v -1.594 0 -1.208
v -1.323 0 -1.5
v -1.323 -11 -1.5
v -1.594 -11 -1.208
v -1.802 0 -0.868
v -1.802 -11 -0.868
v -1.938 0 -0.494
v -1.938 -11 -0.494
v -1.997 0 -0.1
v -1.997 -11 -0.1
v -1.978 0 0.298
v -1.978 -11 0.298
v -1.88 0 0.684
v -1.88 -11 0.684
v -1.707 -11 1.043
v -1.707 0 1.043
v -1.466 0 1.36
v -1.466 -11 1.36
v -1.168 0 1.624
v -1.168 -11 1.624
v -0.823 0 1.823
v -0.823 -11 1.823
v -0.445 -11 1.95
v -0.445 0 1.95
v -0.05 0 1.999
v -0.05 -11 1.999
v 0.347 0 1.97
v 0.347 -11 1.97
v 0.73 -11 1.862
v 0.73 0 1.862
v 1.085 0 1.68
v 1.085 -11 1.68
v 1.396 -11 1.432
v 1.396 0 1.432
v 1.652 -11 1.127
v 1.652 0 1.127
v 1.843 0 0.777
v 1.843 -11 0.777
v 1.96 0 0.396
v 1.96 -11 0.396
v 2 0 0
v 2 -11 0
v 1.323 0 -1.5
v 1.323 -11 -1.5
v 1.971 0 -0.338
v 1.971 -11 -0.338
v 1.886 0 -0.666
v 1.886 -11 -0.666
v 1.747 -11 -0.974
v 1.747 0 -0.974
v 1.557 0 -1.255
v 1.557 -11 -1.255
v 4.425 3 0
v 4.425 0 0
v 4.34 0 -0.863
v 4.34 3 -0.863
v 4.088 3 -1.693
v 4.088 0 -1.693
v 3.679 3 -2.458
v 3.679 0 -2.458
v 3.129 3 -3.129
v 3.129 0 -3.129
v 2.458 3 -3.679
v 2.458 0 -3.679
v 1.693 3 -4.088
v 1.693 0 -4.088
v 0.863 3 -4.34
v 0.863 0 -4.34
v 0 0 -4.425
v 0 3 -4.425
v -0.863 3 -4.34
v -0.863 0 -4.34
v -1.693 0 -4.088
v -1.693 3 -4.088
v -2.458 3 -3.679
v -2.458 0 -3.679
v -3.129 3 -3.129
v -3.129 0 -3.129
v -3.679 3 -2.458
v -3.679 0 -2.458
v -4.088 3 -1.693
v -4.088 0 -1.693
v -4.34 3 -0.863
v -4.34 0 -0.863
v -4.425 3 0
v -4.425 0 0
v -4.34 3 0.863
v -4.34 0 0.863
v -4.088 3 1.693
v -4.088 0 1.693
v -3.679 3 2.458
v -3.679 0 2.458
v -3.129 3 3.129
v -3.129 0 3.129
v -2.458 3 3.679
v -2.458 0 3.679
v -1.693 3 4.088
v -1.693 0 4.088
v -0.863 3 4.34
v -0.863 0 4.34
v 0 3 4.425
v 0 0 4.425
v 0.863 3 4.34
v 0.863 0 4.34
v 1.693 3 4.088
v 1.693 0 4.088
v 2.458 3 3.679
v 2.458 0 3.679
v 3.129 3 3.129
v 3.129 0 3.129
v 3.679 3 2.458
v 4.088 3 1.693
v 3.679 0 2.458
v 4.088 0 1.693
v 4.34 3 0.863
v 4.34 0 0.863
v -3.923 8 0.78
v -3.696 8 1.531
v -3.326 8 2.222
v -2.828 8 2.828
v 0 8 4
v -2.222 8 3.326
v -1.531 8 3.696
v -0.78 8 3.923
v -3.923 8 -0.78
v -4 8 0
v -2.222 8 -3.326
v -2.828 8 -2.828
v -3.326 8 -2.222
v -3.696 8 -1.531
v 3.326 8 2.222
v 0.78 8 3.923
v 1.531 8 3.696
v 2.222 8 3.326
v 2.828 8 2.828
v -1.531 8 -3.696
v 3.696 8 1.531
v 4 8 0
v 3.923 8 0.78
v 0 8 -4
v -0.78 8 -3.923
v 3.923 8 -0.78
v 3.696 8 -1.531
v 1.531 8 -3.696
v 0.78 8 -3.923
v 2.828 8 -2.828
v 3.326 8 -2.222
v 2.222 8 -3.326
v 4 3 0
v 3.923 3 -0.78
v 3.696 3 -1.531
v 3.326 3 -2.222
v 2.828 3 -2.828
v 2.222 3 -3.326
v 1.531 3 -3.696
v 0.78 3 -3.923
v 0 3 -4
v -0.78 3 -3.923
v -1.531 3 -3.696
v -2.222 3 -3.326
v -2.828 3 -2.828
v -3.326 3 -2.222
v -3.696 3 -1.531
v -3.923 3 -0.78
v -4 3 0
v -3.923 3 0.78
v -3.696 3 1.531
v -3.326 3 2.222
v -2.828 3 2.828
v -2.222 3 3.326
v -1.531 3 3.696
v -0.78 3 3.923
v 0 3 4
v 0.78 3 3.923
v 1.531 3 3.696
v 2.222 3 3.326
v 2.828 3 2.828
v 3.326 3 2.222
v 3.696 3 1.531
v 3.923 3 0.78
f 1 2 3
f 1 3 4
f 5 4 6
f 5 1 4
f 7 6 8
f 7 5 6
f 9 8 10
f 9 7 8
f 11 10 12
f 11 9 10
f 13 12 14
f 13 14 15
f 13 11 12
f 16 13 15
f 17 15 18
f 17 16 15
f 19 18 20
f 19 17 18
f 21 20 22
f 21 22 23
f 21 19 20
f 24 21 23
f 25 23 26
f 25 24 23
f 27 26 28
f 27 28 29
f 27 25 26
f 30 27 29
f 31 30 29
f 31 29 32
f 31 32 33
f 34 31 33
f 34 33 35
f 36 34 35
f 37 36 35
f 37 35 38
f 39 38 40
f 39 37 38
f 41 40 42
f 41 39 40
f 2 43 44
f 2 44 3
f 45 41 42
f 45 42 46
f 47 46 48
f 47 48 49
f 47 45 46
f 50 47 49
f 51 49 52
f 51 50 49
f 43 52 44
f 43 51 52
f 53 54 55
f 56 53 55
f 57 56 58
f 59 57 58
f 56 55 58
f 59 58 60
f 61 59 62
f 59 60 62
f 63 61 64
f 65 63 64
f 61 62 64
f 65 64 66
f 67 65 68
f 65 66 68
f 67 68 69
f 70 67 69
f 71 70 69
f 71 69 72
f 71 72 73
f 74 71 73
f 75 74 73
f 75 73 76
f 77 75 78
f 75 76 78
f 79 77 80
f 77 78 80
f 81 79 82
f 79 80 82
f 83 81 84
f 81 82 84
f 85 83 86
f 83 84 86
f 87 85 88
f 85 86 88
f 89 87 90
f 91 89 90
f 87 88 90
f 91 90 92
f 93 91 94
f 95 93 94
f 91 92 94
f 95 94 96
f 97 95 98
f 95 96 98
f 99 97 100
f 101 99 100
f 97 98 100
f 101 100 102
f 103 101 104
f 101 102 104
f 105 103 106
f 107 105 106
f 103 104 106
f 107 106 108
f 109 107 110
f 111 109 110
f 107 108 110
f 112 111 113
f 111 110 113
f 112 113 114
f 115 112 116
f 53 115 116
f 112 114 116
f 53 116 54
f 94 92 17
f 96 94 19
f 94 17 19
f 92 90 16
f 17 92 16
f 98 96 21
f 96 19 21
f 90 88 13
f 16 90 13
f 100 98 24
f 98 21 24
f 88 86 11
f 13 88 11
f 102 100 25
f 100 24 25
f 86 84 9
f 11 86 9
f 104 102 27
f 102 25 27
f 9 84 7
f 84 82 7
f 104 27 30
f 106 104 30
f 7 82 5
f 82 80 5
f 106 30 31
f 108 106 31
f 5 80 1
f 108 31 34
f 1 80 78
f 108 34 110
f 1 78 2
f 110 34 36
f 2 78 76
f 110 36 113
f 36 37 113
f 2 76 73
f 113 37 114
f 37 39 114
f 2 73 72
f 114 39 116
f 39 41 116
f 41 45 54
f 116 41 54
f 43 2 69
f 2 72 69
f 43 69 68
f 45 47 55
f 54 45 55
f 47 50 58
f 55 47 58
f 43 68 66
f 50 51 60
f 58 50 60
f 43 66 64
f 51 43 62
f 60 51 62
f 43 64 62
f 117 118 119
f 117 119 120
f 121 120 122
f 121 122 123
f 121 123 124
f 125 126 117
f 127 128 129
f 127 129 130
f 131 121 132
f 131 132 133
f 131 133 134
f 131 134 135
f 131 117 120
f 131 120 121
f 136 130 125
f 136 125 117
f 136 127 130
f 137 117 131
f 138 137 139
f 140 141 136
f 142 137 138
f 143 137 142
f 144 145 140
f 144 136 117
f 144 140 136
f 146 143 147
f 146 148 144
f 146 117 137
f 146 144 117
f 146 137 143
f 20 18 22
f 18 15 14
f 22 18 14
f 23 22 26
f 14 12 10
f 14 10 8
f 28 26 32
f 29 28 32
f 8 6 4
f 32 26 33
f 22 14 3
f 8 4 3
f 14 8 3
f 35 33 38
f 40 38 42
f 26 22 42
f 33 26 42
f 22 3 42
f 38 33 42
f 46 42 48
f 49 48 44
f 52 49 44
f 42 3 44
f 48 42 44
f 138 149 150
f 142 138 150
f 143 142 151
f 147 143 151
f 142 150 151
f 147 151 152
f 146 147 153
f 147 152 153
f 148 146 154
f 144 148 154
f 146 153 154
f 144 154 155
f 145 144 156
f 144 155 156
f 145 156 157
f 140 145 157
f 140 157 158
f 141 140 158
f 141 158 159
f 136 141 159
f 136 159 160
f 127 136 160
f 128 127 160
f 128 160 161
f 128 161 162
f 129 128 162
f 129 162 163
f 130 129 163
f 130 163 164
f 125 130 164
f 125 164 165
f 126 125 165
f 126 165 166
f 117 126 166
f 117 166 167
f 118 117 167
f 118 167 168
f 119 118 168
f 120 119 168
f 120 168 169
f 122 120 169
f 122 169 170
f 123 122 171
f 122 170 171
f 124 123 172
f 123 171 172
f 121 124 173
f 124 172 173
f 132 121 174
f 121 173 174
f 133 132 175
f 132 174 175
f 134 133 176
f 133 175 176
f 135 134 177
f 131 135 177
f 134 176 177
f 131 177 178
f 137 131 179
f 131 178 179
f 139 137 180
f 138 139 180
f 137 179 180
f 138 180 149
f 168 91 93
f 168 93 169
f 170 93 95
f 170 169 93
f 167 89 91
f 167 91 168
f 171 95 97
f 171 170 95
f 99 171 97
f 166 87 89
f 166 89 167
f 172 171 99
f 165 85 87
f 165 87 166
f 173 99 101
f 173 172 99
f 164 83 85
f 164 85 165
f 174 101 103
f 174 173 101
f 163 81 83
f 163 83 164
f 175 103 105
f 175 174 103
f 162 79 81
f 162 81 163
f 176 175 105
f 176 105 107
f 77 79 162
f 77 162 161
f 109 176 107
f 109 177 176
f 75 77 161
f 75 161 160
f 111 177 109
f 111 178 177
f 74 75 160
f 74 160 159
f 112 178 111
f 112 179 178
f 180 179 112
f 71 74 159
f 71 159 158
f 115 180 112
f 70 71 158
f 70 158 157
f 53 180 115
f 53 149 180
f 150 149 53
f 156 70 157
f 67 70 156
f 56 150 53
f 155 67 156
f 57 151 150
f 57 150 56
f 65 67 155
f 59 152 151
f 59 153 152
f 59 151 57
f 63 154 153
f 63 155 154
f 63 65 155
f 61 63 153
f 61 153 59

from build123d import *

# Parameters (mm, degrees)
SKETCH1_R           = 4.425
SKETCH1_R_2         = 2
SKETCH1_R_3         = 4
BOSS_EXTRUDE1_DEPTH = 3
SKETCH1_3_R         = 4
SKETCH1_3_R_2       = 2
BOSS_EXTRUDE2_DEPTH = 8
BOSS_EXTRUDE3_DEPTH = 11


with BuildPart() as part:
    # Sketch1 → Boss-Extrude1 (new body)
    with BuildSketch(Plane(origin=(0, 0, 0), x_dir=(1, 0, 0), z_dir=(0, 1, 0))):
        with BuildLine():
            ThreePointArc((1.322875656, 1.5), (0, 2), (-1.322875656, 1.5))
            Line((-1.322875656, 1.5), (1.322875656, 1.5))
        make_face()
        with BuildLine():
            Line((1.322875656, 1.5), (-1.322875656, 1.5))
            ThreePointArc((-1.322875656, 1.5), (-0.822875656, -1.822875656), (2, 0))
            ThreePointArc((2, 0), (1.822875656, 0.822875656), (1.322875656, 1.5))
        make_face()
        Circle(SKETCH1_R)
        Circle(SKETCH1_R_2, mode=Mode.SUBTRACT)
        Circle(SKETCH1_R)
        Circle(SKETCH1_R_3, mode=Mode.SUBTRACT)
    extrude(amount=BOSS_EXTRUDE1_DEPTH)

    # Sketch1<3> → Boss-Extrude2 (add)
    with BuildSketch(Plane(origin=(0, 0, 0), x_dir=(1, 0, 0), z_dir=(0, 1, 0))):
        Circle(SKETCH1_3_R)
        Circle(SKETCH1_3_R_2, mode=Mode.SUBTRACT)
        with BuildLine():
            ThreePointArc((1.322875656, 1.5), (0, 2), (-1.322875656, 1.5))
            Line((-1.322875656, 1.5), (1.322875656, 1.5))
        make_face()
        with BuildLine():
            Line((1.322875656, 1.5), (-1.322875656, 1.5))
            ThreePointArc((-1.322875656, 1.5), (-0.822875656, -1.822875656), (2, 0))
            ThreePointArc((2, 0), (1.822875656, 0.822875656), (1.322875656, 1.5))
        make_face()
    extrude(amount=BOSS_EXTRUDE2_DEPTH)

    # Sketch1<4> → Boss-Extrude3 (add)
    with BuildSketch(Plane(origin=(0, 0, 0), x_dir=(1, 0, 0), z_dir=(0, 1, 0))):
        with BuildLine():
            Line((1.322875656, 1.5), (-1.322875656, 1.5))
            ThreePointArc((-1.322875656, 1.5), (-0.822875656, -1.822875656), (2, 0))
            ThreePointArc((2, 0), (1.822875656, 0.822875656), (1.322875656, 1.5))
        make_face()
    extrude(amount=-BOSS_EXTRUDE3_DEPTH)


solid = part.part
